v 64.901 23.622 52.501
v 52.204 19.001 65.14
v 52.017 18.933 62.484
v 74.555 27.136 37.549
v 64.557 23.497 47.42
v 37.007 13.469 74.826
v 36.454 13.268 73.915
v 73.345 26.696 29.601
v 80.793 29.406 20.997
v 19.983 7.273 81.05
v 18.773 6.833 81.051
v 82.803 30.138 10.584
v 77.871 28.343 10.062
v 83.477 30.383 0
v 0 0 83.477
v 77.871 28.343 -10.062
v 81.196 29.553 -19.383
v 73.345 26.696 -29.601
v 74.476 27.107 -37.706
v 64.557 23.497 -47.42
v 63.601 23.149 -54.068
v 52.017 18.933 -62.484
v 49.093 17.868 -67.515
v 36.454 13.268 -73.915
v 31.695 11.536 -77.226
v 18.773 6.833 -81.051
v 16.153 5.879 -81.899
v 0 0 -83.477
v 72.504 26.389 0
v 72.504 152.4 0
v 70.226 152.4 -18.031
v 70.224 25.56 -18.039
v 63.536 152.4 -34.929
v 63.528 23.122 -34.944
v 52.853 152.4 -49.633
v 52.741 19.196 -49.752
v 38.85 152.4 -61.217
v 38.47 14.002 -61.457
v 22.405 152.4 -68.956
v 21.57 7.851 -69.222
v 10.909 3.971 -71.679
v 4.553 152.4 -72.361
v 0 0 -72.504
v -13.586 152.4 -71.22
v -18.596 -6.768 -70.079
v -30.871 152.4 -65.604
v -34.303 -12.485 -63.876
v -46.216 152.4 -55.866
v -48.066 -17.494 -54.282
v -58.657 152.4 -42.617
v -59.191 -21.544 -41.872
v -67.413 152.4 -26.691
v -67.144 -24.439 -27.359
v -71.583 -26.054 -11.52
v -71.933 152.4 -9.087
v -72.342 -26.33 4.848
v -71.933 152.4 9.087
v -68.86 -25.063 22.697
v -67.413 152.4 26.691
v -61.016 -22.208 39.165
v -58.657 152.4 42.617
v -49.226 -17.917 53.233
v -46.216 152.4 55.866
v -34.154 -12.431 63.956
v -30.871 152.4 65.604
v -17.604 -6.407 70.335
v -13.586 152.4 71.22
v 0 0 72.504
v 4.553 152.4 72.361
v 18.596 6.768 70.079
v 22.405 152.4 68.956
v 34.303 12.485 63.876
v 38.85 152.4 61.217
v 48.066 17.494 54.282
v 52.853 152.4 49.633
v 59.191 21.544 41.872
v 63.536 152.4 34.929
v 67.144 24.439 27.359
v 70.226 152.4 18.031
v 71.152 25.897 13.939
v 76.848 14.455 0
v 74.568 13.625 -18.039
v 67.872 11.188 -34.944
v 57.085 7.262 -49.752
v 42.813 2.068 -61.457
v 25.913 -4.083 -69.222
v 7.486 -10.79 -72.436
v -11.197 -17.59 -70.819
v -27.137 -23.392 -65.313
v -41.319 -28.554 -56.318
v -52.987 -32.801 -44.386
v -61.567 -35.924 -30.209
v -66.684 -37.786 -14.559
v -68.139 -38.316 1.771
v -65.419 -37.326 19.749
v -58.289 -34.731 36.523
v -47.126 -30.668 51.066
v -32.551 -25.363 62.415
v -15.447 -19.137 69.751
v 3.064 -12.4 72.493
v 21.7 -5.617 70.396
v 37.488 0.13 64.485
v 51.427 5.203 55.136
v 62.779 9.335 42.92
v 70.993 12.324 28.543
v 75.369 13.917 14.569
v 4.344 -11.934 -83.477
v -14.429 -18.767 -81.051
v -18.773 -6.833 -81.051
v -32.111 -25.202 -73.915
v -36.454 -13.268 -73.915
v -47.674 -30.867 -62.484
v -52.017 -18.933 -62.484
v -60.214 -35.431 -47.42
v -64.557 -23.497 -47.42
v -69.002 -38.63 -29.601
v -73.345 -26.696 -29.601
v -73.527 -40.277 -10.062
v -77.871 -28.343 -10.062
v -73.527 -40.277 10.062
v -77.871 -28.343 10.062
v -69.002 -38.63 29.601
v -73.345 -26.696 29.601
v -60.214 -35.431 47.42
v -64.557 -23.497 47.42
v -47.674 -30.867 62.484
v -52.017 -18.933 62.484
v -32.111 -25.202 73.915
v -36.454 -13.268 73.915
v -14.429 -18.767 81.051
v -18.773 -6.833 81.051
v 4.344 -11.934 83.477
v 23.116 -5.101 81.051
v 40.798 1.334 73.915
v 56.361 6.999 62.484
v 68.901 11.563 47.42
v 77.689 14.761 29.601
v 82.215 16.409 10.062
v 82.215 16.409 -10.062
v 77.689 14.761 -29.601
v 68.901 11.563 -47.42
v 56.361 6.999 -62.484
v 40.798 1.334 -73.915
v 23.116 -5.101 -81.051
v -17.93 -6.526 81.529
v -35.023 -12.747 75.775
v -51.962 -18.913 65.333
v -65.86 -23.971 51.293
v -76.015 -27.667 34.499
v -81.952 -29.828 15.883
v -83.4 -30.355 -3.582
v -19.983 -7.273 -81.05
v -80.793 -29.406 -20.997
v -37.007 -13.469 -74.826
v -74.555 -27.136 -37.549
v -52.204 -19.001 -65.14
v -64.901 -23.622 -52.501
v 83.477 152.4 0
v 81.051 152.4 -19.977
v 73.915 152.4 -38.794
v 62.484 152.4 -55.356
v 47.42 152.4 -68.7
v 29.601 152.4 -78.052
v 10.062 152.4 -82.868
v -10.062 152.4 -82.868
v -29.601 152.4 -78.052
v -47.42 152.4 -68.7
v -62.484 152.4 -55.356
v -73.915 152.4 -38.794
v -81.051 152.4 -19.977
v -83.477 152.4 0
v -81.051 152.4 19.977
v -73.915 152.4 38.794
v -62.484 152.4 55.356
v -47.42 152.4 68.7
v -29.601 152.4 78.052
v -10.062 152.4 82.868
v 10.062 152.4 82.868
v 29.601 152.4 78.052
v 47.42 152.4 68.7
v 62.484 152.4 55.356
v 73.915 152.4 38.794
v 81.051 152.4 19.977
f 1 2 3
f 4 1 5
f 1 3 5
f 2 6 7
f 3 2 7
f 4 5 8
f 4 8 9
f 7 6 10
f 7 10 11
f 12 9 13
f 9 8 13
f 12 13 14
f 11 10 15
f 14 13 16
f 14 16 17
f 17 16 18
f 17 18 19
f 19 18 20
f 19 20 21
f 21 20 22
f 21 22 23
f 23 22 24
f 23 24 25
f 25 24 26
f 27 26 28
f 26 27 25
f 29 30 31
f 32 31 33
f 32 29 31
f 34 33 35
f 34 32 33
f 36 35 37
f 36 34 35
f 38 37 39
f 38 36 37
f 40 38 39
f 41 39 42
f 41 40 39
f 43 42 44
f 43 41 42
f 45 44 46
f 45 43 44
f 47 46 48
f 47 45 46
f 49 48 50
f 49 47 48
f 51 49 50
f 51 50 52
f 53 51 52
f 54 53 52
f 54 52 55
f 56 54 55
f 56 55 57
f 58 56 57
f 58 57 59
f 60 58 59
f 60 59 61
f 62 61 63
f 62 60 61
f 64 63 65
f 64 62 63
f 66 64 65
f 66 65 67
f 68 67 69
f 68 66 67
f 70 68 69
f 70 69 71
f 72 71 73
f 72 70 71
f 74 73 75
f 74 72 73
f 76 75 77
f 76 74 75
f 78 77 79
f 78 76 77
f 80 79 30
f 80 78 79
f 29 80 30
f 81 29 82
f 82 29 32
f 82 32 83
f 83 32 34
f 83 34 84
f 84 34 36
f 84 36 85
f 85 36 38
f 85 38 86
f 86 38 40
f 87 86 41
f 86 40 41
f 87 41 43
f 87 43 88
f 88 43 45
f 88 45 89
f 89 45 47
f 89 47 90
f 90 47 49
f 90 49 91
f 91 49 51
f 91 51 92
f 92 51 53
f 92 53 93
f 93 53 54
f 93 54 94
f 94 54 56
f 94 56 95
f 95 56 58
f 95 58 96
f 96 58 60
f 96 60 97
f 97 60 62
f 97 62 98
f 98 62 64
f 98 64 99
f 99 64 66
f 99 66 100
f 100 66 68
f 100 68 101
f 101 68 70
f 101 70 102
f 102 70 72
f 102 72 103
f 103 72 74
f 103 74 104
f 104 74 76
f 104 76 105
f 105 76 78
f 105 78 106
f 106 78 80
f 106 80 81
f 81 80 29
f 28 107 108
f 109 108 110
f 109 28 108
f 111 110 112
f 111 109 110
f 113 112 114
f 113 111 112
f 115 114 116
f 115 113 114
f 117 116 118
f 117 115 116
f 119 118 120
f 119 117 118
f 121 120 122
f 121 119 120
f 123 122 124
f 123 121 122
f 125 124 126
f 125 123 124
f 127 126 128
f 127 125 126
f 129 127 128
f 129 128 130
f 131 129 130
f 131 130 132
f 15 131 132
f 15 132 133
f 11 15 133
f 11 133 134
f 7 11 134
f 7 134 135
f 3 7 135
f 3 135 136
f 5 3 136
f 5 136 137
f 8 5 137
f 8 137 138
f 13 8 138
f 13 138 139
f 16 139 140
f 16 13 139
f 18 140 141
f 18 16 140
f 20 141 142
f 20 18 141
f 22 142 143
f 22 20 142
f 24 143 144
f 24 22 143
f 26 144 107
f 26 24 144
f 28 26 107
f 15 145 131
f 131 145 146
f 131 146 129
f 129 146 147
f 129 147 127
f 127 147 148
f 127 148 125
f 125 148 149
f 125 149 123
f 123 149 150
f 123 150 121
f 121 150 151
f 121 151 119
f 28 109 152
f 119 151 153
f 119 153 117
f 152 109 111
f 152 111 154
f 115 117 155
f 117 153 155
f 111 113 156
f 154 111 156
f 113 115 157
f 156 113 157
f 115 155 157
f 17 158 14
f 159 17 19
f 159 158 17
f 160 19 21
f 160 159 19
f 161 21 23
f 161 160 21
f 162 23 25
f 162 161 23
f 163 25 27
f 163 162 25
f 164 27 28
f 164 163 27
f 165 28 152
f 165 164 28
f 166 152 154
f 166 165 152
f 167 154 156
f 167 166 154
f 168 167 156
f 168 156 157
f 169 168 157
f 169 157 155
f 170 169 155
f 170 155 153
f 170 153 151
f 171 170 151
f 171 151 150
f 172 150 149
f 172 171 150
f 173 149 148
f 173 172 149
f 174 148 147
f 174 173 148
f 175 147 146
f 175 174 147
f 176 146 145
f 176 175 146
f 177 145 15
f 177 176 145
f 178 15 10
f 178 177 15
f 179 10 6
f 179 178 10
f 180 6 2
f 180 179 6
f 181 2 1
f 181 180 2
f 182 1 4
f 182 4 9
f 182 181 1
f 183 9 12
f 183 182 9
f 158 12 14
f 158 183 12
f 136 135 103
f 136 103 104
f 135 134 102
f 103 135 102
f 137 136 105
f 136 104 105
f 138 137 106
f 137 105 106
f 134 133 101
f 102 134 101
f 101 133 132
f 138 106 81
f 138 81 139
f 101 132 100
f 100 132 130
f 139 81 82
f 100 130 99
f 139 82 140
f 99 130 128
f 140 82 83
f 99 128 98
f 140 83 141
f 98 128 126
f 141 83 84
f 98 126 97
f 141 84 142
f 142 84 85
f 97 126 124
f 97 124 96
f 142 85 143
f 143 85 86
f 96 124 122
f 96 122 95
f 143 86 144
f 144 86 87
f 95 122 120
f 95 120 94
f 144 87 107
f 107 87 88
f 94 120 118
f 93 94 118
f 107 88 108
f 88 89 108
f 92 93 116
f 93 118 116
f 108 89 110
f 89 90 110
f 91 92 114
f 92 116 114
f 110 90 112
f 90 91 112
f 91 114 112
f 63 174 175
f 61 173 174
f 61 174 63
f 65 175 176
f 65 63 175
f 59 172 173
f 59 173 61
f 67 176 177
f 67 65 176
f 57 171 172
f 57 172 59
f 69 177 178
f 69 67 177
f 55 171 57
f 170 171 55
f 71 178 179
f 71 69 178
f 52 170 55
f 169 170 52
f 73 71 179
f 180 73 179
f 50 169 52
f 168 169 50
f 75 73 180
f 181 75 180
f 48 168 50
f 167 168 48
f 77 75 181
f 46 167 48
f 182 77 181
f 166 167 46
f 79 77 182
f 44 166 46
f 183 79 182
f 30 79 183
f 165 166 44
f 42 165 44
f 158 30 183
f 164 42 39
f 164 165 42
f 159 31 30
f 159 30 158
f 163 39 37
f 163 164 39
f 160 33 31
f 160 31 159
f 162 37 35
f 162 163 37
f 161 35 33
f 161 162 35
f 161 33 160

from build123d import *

# Parameters (mm, degrees)
SKETCH1_R                = 83.4771
SKETCH1_R_2              = 72.5043
BOSS_EXTRUDE1_DEPTH      = 152.4
BOSS_EXTRUDE1_DEPTH_BACK = 50.8
SKETCH4_W                = 203.2
SKETCH4_H                = 203.2
CUT_EXTRUDE1_DEPTH       = 152.4
SKETCH5_R                = 83.4771
SKETCH5_RX               = 77.157464469
SKETCH5_RY               = 72.5043
BOSS_EXTRUDE3_DEPTH      = 12.7


with BuildPart() as part:
    # Sketch1 → Boss-Extrude1 (new body, two sides)
    with BuildSketch(Plane(origin=(0, 0, 0), x_dir=(1, 0, 0), z_dir=(0, 1, 0))) as boss_extrude1_sk:
        Circle(SKETCH1_R)
        Circle(SKETCH1_R_2, mode=Mode.SUBTRACT)
    extrude(amount=BOSS_EXTRUDE1_DEPTH)
    extrude(boss_extrude1_sk.sketch, amount=-BOSS_EXTRUDE1_DEPTH_BACK)

    # Sketch4 → Cut-Extrude1 (cut)
    with BuildSketch(Plane(origin=(0, 0, 0), x_dir=(0, 0, -1), z_dir=(-0.342020143, 0.939692621, 0))):
        Rectangle(SKETCH4_W, SKETCH4_H)
    extrude(amount=-CUT_EXTRUDE1_DEPTH, mode=Mode.SUBTRACT)

    # Sketch5 → Boss-Extrude3 (add)
    with BuildSketch(Plane(origin=(0, 0, 0), x_dir=(0, 0, -1), z_dir=(-0.342020143, 0.939692621, 0))):
        Circle(SKETCH5_R)
        with Locations(Location((0, 0), (0, 0, -90))):
            Ellipse(SKETCH5_RX, SKETCH5_RY, mode=Mode.SUBTRACT)
    extrude(amount=-BOSS_EXTRUDE3_DEPTH)


solid = part.part
